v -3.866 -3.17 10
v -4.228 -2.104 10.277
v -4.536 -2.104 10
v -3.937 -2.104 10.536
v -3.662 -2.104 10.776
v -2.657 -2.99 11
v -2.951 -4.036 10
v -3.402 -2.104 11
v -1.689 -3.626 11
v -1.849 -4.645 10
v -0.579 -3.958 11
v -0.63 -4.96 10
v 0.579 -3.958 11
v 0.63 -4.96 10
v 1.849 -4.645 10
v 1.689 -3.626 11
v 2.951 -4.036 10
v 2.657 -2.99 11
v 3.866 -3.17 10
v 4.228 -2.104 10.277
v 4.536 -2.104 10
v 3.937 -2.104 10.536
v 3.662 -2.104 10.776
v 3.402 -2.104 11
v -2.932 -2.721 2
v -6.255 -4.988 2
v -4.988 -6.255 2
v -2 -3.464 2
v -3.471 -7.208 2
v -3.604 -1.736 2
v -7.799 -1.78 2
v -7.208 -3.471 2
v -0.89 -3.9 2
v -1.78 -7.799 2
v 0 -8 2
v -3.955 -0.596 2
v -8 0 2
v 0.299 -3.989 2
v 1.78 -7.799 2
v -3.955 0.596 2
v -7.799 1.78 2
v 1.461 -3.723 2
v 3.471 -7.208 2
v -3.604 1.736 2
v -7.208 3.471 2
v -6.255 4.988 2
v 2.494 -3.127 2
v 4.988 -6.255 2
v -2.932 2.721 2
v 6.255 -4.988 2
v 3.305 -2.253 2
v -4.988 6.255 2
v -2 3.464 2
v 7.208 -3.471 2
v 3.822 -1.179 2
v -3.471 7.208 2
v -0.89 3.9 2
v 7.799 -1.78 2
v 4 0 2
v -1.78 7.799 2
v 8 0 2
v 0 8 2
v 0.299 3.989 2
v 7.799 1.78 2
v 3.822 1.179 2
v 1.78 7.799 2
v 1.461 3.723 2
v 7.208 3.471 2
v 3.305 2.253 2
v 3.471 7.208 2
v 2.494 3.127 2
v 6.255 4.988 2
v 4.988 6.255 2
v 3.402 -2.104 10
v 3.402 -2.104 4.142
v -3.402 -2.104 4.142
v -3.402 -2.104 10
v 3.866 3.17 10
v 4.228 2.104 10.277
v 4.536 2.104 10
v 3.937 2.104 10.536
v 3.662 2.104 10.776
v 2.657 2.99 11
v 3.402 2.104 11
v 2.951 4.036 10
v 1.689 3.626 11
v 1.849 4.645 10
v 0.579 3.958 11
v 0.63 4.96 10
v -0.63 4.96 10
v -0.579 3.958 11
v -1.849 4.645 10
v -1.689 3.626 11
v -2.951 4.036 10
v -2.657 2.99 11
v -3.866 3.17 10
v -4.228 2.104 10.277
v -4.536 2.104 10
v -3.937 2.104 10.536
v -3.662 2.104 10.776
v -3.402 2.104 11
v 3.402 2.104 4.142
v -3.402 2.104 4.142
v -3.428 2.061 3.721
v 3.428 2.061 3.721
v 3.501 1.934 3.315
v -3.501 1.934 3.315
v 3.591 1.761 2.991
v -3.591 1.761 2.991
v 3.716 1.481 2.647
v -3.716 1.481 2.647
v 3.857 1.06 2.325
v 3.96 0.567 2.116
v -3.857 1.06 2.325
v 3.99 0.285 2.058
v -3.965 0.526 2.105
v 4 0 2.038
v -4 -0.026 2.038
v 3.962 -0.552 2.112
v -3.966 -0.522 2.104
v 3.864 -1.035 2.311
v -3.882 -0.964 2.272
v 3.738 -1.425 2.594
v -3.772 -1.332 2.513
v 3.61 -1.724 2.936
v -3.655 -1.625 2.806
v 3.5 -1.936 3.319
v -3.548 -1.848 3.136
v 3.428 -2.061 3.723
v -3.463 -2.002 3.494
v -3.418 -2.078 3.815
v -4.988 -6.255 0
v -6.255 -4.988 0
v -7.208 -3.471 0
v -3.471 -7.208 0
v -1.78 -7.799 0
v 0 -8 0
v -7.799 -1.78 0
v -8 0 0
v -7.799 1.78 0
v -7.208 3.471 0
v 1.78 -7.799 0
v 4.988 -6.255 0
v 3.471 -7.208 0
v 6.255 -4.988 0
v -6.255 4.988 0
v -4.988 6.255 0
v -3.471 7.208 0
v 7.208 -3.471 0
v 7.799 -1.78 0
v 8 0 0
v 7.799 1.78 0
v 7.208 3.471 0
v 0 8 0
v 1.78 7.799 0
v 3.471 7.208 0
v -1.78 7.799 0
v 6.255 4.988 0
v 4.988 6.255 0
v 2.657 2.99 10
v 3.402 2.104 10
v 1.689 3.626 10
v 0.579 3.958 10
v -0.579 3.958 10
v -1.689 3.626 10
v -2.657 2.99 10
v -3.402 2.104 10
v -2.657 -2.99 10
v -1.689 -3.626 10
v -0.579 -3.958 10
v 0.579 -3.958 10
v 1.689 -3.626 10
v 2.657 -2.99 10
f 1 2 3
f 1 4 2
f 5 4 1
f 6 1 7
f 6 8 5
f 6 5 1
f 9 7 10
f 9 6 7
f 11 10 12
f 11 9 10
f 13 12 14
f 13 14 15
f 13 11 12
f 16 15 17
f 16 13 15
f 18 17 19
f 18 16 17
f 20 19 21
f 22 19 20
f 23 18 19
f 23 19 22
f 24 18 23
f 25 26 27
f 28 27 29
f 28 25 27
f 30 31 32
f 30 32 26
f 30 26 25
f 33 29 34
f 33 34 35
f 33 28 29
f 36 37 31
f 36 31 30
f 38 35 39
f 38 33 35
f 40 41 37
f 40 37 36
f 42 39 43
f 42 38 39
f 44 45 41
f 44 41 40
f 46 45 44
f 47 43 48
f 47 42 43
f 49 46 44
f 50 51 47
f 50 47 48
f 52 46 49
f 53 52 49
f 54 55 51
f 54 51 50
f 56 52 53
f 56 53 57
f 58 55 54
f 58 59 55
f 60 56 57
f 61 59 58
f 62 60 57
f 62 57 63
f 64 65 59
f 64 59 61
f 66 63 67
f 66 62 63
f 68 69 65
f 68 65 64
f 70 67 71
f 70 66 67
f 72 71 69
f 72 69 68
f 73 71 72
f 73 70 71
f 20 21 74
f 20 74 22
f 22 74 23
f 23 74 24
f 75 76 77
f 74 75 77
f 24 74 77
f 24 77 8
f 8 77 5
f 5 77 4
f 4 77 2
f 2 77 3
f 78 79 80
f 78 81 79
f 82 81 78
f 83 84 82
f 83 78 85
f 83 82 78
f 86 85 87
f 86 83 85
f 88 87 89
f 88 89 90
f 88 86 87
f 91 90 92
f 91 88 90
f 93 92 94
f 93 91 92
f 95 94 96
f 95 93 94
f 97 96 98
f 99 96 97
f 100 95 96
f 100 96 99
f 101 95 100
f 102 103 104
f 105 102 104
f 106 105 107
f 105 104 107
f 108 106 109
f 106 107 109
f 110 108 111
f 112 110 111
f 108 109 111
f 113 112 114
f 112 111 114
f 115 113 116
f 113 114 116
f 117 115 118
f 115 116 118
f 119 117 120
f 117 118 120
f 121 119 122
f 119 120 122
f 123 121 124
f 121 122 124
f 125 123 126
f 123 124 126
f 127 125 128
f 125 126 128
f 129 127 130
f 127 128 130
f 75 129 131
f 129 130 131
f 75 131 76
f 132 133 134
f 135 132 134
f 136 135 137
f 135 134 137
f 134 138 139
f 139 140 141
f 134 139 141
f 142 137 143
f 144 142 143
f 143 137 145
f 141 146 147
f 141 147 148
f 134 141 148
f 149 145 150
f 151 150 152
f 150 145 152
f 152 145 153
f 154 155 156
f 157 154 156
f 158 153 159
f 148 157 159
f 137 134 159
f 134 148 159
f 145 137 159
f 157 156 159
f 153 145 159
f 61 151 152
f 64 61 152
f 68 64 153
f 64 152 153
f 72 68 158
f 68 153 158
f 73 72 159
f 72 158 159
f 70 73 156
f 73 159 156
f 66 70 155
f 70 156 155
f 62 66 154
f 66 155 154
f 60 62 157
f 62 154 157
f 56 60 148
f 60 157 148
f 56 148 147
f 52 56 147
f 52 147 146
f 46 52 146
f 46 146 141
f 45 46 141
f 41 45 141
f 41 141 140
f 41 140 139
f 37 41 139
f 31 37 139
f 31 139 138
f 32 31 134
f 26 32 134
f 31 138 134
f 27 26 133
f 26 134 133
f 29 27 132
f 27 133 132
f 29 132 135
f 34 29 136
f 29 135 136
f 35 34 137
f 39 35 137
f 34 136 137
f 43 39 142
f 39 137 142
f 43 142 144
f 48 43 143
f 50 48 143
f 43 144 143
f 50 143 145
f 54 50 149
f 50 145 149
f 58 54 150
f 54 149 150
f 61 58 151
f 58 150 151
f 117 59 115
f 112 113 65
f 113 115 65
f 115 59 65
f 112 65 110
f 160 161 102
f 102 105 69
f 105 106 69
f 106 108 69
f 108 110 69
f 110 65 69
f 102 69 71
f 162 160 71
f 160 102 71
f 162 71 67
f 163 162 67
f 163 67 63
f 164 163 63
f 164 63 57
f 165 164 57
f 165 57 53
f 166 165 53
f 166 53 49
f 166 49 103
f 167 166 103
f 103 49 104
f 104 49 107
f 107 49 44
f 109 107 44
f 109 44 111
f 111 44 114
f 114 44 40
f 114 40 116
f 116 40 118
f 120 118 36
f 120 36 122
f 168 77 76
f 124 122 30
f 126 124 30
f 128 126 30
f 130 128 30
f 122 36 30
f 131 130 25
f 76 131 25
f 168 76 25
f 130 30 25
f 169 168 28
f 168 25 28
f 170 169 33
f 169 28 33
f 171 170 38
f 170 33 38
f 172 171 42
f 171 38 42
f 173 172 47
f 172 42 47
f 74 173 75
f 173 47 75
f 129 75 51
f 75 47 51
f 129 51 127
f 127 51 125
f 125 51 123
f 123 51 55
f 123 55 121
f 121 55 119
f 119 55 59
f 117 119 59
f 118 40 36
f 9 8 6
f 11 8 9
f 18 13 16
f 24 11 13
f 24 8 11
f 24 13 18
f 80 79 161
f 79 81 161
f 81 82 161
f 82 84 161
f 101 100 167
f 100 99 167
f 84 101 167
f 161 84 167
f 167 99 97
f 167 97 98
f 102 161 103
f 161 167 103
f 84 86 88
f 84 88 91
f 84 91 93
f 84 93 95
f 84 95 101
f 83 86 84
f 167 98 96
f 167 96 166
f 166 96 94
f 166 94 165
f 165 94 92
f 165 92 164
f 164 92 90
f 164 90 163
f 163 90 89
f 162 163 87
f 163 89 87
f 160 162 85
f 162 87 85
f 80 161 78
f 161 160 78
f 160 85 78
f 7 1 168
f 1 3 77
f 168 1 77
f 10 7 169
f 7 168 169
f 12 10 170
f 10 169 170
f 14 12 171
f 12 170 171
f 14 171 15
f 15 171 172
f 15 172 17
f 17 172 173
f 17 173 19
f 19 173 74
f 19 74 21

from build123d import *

# Parameters (mm, degrees)
SKETCH1_R               = 8
BOSS_EXTRUDE1_DEPTH     = 2
SKETCH2_R               = 4
BOSS_EXTRUDE2_DEPTH     = 9
SKETCH7_R               = 5
CUT_EXTRUDE1_DEPTH      = 9
CUT_EXTRUDE1_DEPTH_BACK = 9


with BuildPart() as part:
    # Sketch1 → Boss-Extrude1 (new body)
    with BuildSketch(Plane.XY):
        Circle(SKETCH1_R)
    extrude(amount=BOSS_EXTRUDE1_DEPTH)

    # Sketch2 → Boss-Extrude2 (add)
    with BuildSketch(Plane.XY.offset(2)):
        Circle(SKETCH2_R)
    extrude(amount=BOSS_EXTRUDE2_DEPTH)

    # Sketch7 → section 0 of loft1
    with BuildSketch(Plane.XY.offset(10), mode=Mode.PRIVATE) as loft1_s0:
        Circle(SKETCH7_R)
    # loft up to a face of the part (loft1)
    loft([loft1_s0.sketch, part.faces().sort_by_distance((0, 0, 11))[0]])

    # Sketch4 → Cut-Extrude1 (cut, two sides: drawn at the far end of the back side and taken through both)
    with BuildSketch(Plane(origin=(0, 0, 0), x_dir=(0, 0, -1), z_dir=(1, 0, 0)).offset(-CUT_EXTRUDE1_DEPTH_BACK)):
        with BuildLine():
            Line((-11, 2.103629109), (-4.141860423, 2.103629109))
            ThreePointArc((-4.141860423, 2.103629109), (-2.038231313, 0), (-4.141860423, -2.103629109))
            Line((-4.141860423, -2.103629109), (-11, -2.103629109))
            ThreePointArc((-11, -2.103629109), (-13.103629109, 0), (-11, 2.103629109))
        make_face()
    extrude(amount=CUT_EXTRUDE1_DEPTH + CUT_EXTRUDE1_DEPTH_BACK, mode=Mode.SUBTRACT)


solid = part.part
